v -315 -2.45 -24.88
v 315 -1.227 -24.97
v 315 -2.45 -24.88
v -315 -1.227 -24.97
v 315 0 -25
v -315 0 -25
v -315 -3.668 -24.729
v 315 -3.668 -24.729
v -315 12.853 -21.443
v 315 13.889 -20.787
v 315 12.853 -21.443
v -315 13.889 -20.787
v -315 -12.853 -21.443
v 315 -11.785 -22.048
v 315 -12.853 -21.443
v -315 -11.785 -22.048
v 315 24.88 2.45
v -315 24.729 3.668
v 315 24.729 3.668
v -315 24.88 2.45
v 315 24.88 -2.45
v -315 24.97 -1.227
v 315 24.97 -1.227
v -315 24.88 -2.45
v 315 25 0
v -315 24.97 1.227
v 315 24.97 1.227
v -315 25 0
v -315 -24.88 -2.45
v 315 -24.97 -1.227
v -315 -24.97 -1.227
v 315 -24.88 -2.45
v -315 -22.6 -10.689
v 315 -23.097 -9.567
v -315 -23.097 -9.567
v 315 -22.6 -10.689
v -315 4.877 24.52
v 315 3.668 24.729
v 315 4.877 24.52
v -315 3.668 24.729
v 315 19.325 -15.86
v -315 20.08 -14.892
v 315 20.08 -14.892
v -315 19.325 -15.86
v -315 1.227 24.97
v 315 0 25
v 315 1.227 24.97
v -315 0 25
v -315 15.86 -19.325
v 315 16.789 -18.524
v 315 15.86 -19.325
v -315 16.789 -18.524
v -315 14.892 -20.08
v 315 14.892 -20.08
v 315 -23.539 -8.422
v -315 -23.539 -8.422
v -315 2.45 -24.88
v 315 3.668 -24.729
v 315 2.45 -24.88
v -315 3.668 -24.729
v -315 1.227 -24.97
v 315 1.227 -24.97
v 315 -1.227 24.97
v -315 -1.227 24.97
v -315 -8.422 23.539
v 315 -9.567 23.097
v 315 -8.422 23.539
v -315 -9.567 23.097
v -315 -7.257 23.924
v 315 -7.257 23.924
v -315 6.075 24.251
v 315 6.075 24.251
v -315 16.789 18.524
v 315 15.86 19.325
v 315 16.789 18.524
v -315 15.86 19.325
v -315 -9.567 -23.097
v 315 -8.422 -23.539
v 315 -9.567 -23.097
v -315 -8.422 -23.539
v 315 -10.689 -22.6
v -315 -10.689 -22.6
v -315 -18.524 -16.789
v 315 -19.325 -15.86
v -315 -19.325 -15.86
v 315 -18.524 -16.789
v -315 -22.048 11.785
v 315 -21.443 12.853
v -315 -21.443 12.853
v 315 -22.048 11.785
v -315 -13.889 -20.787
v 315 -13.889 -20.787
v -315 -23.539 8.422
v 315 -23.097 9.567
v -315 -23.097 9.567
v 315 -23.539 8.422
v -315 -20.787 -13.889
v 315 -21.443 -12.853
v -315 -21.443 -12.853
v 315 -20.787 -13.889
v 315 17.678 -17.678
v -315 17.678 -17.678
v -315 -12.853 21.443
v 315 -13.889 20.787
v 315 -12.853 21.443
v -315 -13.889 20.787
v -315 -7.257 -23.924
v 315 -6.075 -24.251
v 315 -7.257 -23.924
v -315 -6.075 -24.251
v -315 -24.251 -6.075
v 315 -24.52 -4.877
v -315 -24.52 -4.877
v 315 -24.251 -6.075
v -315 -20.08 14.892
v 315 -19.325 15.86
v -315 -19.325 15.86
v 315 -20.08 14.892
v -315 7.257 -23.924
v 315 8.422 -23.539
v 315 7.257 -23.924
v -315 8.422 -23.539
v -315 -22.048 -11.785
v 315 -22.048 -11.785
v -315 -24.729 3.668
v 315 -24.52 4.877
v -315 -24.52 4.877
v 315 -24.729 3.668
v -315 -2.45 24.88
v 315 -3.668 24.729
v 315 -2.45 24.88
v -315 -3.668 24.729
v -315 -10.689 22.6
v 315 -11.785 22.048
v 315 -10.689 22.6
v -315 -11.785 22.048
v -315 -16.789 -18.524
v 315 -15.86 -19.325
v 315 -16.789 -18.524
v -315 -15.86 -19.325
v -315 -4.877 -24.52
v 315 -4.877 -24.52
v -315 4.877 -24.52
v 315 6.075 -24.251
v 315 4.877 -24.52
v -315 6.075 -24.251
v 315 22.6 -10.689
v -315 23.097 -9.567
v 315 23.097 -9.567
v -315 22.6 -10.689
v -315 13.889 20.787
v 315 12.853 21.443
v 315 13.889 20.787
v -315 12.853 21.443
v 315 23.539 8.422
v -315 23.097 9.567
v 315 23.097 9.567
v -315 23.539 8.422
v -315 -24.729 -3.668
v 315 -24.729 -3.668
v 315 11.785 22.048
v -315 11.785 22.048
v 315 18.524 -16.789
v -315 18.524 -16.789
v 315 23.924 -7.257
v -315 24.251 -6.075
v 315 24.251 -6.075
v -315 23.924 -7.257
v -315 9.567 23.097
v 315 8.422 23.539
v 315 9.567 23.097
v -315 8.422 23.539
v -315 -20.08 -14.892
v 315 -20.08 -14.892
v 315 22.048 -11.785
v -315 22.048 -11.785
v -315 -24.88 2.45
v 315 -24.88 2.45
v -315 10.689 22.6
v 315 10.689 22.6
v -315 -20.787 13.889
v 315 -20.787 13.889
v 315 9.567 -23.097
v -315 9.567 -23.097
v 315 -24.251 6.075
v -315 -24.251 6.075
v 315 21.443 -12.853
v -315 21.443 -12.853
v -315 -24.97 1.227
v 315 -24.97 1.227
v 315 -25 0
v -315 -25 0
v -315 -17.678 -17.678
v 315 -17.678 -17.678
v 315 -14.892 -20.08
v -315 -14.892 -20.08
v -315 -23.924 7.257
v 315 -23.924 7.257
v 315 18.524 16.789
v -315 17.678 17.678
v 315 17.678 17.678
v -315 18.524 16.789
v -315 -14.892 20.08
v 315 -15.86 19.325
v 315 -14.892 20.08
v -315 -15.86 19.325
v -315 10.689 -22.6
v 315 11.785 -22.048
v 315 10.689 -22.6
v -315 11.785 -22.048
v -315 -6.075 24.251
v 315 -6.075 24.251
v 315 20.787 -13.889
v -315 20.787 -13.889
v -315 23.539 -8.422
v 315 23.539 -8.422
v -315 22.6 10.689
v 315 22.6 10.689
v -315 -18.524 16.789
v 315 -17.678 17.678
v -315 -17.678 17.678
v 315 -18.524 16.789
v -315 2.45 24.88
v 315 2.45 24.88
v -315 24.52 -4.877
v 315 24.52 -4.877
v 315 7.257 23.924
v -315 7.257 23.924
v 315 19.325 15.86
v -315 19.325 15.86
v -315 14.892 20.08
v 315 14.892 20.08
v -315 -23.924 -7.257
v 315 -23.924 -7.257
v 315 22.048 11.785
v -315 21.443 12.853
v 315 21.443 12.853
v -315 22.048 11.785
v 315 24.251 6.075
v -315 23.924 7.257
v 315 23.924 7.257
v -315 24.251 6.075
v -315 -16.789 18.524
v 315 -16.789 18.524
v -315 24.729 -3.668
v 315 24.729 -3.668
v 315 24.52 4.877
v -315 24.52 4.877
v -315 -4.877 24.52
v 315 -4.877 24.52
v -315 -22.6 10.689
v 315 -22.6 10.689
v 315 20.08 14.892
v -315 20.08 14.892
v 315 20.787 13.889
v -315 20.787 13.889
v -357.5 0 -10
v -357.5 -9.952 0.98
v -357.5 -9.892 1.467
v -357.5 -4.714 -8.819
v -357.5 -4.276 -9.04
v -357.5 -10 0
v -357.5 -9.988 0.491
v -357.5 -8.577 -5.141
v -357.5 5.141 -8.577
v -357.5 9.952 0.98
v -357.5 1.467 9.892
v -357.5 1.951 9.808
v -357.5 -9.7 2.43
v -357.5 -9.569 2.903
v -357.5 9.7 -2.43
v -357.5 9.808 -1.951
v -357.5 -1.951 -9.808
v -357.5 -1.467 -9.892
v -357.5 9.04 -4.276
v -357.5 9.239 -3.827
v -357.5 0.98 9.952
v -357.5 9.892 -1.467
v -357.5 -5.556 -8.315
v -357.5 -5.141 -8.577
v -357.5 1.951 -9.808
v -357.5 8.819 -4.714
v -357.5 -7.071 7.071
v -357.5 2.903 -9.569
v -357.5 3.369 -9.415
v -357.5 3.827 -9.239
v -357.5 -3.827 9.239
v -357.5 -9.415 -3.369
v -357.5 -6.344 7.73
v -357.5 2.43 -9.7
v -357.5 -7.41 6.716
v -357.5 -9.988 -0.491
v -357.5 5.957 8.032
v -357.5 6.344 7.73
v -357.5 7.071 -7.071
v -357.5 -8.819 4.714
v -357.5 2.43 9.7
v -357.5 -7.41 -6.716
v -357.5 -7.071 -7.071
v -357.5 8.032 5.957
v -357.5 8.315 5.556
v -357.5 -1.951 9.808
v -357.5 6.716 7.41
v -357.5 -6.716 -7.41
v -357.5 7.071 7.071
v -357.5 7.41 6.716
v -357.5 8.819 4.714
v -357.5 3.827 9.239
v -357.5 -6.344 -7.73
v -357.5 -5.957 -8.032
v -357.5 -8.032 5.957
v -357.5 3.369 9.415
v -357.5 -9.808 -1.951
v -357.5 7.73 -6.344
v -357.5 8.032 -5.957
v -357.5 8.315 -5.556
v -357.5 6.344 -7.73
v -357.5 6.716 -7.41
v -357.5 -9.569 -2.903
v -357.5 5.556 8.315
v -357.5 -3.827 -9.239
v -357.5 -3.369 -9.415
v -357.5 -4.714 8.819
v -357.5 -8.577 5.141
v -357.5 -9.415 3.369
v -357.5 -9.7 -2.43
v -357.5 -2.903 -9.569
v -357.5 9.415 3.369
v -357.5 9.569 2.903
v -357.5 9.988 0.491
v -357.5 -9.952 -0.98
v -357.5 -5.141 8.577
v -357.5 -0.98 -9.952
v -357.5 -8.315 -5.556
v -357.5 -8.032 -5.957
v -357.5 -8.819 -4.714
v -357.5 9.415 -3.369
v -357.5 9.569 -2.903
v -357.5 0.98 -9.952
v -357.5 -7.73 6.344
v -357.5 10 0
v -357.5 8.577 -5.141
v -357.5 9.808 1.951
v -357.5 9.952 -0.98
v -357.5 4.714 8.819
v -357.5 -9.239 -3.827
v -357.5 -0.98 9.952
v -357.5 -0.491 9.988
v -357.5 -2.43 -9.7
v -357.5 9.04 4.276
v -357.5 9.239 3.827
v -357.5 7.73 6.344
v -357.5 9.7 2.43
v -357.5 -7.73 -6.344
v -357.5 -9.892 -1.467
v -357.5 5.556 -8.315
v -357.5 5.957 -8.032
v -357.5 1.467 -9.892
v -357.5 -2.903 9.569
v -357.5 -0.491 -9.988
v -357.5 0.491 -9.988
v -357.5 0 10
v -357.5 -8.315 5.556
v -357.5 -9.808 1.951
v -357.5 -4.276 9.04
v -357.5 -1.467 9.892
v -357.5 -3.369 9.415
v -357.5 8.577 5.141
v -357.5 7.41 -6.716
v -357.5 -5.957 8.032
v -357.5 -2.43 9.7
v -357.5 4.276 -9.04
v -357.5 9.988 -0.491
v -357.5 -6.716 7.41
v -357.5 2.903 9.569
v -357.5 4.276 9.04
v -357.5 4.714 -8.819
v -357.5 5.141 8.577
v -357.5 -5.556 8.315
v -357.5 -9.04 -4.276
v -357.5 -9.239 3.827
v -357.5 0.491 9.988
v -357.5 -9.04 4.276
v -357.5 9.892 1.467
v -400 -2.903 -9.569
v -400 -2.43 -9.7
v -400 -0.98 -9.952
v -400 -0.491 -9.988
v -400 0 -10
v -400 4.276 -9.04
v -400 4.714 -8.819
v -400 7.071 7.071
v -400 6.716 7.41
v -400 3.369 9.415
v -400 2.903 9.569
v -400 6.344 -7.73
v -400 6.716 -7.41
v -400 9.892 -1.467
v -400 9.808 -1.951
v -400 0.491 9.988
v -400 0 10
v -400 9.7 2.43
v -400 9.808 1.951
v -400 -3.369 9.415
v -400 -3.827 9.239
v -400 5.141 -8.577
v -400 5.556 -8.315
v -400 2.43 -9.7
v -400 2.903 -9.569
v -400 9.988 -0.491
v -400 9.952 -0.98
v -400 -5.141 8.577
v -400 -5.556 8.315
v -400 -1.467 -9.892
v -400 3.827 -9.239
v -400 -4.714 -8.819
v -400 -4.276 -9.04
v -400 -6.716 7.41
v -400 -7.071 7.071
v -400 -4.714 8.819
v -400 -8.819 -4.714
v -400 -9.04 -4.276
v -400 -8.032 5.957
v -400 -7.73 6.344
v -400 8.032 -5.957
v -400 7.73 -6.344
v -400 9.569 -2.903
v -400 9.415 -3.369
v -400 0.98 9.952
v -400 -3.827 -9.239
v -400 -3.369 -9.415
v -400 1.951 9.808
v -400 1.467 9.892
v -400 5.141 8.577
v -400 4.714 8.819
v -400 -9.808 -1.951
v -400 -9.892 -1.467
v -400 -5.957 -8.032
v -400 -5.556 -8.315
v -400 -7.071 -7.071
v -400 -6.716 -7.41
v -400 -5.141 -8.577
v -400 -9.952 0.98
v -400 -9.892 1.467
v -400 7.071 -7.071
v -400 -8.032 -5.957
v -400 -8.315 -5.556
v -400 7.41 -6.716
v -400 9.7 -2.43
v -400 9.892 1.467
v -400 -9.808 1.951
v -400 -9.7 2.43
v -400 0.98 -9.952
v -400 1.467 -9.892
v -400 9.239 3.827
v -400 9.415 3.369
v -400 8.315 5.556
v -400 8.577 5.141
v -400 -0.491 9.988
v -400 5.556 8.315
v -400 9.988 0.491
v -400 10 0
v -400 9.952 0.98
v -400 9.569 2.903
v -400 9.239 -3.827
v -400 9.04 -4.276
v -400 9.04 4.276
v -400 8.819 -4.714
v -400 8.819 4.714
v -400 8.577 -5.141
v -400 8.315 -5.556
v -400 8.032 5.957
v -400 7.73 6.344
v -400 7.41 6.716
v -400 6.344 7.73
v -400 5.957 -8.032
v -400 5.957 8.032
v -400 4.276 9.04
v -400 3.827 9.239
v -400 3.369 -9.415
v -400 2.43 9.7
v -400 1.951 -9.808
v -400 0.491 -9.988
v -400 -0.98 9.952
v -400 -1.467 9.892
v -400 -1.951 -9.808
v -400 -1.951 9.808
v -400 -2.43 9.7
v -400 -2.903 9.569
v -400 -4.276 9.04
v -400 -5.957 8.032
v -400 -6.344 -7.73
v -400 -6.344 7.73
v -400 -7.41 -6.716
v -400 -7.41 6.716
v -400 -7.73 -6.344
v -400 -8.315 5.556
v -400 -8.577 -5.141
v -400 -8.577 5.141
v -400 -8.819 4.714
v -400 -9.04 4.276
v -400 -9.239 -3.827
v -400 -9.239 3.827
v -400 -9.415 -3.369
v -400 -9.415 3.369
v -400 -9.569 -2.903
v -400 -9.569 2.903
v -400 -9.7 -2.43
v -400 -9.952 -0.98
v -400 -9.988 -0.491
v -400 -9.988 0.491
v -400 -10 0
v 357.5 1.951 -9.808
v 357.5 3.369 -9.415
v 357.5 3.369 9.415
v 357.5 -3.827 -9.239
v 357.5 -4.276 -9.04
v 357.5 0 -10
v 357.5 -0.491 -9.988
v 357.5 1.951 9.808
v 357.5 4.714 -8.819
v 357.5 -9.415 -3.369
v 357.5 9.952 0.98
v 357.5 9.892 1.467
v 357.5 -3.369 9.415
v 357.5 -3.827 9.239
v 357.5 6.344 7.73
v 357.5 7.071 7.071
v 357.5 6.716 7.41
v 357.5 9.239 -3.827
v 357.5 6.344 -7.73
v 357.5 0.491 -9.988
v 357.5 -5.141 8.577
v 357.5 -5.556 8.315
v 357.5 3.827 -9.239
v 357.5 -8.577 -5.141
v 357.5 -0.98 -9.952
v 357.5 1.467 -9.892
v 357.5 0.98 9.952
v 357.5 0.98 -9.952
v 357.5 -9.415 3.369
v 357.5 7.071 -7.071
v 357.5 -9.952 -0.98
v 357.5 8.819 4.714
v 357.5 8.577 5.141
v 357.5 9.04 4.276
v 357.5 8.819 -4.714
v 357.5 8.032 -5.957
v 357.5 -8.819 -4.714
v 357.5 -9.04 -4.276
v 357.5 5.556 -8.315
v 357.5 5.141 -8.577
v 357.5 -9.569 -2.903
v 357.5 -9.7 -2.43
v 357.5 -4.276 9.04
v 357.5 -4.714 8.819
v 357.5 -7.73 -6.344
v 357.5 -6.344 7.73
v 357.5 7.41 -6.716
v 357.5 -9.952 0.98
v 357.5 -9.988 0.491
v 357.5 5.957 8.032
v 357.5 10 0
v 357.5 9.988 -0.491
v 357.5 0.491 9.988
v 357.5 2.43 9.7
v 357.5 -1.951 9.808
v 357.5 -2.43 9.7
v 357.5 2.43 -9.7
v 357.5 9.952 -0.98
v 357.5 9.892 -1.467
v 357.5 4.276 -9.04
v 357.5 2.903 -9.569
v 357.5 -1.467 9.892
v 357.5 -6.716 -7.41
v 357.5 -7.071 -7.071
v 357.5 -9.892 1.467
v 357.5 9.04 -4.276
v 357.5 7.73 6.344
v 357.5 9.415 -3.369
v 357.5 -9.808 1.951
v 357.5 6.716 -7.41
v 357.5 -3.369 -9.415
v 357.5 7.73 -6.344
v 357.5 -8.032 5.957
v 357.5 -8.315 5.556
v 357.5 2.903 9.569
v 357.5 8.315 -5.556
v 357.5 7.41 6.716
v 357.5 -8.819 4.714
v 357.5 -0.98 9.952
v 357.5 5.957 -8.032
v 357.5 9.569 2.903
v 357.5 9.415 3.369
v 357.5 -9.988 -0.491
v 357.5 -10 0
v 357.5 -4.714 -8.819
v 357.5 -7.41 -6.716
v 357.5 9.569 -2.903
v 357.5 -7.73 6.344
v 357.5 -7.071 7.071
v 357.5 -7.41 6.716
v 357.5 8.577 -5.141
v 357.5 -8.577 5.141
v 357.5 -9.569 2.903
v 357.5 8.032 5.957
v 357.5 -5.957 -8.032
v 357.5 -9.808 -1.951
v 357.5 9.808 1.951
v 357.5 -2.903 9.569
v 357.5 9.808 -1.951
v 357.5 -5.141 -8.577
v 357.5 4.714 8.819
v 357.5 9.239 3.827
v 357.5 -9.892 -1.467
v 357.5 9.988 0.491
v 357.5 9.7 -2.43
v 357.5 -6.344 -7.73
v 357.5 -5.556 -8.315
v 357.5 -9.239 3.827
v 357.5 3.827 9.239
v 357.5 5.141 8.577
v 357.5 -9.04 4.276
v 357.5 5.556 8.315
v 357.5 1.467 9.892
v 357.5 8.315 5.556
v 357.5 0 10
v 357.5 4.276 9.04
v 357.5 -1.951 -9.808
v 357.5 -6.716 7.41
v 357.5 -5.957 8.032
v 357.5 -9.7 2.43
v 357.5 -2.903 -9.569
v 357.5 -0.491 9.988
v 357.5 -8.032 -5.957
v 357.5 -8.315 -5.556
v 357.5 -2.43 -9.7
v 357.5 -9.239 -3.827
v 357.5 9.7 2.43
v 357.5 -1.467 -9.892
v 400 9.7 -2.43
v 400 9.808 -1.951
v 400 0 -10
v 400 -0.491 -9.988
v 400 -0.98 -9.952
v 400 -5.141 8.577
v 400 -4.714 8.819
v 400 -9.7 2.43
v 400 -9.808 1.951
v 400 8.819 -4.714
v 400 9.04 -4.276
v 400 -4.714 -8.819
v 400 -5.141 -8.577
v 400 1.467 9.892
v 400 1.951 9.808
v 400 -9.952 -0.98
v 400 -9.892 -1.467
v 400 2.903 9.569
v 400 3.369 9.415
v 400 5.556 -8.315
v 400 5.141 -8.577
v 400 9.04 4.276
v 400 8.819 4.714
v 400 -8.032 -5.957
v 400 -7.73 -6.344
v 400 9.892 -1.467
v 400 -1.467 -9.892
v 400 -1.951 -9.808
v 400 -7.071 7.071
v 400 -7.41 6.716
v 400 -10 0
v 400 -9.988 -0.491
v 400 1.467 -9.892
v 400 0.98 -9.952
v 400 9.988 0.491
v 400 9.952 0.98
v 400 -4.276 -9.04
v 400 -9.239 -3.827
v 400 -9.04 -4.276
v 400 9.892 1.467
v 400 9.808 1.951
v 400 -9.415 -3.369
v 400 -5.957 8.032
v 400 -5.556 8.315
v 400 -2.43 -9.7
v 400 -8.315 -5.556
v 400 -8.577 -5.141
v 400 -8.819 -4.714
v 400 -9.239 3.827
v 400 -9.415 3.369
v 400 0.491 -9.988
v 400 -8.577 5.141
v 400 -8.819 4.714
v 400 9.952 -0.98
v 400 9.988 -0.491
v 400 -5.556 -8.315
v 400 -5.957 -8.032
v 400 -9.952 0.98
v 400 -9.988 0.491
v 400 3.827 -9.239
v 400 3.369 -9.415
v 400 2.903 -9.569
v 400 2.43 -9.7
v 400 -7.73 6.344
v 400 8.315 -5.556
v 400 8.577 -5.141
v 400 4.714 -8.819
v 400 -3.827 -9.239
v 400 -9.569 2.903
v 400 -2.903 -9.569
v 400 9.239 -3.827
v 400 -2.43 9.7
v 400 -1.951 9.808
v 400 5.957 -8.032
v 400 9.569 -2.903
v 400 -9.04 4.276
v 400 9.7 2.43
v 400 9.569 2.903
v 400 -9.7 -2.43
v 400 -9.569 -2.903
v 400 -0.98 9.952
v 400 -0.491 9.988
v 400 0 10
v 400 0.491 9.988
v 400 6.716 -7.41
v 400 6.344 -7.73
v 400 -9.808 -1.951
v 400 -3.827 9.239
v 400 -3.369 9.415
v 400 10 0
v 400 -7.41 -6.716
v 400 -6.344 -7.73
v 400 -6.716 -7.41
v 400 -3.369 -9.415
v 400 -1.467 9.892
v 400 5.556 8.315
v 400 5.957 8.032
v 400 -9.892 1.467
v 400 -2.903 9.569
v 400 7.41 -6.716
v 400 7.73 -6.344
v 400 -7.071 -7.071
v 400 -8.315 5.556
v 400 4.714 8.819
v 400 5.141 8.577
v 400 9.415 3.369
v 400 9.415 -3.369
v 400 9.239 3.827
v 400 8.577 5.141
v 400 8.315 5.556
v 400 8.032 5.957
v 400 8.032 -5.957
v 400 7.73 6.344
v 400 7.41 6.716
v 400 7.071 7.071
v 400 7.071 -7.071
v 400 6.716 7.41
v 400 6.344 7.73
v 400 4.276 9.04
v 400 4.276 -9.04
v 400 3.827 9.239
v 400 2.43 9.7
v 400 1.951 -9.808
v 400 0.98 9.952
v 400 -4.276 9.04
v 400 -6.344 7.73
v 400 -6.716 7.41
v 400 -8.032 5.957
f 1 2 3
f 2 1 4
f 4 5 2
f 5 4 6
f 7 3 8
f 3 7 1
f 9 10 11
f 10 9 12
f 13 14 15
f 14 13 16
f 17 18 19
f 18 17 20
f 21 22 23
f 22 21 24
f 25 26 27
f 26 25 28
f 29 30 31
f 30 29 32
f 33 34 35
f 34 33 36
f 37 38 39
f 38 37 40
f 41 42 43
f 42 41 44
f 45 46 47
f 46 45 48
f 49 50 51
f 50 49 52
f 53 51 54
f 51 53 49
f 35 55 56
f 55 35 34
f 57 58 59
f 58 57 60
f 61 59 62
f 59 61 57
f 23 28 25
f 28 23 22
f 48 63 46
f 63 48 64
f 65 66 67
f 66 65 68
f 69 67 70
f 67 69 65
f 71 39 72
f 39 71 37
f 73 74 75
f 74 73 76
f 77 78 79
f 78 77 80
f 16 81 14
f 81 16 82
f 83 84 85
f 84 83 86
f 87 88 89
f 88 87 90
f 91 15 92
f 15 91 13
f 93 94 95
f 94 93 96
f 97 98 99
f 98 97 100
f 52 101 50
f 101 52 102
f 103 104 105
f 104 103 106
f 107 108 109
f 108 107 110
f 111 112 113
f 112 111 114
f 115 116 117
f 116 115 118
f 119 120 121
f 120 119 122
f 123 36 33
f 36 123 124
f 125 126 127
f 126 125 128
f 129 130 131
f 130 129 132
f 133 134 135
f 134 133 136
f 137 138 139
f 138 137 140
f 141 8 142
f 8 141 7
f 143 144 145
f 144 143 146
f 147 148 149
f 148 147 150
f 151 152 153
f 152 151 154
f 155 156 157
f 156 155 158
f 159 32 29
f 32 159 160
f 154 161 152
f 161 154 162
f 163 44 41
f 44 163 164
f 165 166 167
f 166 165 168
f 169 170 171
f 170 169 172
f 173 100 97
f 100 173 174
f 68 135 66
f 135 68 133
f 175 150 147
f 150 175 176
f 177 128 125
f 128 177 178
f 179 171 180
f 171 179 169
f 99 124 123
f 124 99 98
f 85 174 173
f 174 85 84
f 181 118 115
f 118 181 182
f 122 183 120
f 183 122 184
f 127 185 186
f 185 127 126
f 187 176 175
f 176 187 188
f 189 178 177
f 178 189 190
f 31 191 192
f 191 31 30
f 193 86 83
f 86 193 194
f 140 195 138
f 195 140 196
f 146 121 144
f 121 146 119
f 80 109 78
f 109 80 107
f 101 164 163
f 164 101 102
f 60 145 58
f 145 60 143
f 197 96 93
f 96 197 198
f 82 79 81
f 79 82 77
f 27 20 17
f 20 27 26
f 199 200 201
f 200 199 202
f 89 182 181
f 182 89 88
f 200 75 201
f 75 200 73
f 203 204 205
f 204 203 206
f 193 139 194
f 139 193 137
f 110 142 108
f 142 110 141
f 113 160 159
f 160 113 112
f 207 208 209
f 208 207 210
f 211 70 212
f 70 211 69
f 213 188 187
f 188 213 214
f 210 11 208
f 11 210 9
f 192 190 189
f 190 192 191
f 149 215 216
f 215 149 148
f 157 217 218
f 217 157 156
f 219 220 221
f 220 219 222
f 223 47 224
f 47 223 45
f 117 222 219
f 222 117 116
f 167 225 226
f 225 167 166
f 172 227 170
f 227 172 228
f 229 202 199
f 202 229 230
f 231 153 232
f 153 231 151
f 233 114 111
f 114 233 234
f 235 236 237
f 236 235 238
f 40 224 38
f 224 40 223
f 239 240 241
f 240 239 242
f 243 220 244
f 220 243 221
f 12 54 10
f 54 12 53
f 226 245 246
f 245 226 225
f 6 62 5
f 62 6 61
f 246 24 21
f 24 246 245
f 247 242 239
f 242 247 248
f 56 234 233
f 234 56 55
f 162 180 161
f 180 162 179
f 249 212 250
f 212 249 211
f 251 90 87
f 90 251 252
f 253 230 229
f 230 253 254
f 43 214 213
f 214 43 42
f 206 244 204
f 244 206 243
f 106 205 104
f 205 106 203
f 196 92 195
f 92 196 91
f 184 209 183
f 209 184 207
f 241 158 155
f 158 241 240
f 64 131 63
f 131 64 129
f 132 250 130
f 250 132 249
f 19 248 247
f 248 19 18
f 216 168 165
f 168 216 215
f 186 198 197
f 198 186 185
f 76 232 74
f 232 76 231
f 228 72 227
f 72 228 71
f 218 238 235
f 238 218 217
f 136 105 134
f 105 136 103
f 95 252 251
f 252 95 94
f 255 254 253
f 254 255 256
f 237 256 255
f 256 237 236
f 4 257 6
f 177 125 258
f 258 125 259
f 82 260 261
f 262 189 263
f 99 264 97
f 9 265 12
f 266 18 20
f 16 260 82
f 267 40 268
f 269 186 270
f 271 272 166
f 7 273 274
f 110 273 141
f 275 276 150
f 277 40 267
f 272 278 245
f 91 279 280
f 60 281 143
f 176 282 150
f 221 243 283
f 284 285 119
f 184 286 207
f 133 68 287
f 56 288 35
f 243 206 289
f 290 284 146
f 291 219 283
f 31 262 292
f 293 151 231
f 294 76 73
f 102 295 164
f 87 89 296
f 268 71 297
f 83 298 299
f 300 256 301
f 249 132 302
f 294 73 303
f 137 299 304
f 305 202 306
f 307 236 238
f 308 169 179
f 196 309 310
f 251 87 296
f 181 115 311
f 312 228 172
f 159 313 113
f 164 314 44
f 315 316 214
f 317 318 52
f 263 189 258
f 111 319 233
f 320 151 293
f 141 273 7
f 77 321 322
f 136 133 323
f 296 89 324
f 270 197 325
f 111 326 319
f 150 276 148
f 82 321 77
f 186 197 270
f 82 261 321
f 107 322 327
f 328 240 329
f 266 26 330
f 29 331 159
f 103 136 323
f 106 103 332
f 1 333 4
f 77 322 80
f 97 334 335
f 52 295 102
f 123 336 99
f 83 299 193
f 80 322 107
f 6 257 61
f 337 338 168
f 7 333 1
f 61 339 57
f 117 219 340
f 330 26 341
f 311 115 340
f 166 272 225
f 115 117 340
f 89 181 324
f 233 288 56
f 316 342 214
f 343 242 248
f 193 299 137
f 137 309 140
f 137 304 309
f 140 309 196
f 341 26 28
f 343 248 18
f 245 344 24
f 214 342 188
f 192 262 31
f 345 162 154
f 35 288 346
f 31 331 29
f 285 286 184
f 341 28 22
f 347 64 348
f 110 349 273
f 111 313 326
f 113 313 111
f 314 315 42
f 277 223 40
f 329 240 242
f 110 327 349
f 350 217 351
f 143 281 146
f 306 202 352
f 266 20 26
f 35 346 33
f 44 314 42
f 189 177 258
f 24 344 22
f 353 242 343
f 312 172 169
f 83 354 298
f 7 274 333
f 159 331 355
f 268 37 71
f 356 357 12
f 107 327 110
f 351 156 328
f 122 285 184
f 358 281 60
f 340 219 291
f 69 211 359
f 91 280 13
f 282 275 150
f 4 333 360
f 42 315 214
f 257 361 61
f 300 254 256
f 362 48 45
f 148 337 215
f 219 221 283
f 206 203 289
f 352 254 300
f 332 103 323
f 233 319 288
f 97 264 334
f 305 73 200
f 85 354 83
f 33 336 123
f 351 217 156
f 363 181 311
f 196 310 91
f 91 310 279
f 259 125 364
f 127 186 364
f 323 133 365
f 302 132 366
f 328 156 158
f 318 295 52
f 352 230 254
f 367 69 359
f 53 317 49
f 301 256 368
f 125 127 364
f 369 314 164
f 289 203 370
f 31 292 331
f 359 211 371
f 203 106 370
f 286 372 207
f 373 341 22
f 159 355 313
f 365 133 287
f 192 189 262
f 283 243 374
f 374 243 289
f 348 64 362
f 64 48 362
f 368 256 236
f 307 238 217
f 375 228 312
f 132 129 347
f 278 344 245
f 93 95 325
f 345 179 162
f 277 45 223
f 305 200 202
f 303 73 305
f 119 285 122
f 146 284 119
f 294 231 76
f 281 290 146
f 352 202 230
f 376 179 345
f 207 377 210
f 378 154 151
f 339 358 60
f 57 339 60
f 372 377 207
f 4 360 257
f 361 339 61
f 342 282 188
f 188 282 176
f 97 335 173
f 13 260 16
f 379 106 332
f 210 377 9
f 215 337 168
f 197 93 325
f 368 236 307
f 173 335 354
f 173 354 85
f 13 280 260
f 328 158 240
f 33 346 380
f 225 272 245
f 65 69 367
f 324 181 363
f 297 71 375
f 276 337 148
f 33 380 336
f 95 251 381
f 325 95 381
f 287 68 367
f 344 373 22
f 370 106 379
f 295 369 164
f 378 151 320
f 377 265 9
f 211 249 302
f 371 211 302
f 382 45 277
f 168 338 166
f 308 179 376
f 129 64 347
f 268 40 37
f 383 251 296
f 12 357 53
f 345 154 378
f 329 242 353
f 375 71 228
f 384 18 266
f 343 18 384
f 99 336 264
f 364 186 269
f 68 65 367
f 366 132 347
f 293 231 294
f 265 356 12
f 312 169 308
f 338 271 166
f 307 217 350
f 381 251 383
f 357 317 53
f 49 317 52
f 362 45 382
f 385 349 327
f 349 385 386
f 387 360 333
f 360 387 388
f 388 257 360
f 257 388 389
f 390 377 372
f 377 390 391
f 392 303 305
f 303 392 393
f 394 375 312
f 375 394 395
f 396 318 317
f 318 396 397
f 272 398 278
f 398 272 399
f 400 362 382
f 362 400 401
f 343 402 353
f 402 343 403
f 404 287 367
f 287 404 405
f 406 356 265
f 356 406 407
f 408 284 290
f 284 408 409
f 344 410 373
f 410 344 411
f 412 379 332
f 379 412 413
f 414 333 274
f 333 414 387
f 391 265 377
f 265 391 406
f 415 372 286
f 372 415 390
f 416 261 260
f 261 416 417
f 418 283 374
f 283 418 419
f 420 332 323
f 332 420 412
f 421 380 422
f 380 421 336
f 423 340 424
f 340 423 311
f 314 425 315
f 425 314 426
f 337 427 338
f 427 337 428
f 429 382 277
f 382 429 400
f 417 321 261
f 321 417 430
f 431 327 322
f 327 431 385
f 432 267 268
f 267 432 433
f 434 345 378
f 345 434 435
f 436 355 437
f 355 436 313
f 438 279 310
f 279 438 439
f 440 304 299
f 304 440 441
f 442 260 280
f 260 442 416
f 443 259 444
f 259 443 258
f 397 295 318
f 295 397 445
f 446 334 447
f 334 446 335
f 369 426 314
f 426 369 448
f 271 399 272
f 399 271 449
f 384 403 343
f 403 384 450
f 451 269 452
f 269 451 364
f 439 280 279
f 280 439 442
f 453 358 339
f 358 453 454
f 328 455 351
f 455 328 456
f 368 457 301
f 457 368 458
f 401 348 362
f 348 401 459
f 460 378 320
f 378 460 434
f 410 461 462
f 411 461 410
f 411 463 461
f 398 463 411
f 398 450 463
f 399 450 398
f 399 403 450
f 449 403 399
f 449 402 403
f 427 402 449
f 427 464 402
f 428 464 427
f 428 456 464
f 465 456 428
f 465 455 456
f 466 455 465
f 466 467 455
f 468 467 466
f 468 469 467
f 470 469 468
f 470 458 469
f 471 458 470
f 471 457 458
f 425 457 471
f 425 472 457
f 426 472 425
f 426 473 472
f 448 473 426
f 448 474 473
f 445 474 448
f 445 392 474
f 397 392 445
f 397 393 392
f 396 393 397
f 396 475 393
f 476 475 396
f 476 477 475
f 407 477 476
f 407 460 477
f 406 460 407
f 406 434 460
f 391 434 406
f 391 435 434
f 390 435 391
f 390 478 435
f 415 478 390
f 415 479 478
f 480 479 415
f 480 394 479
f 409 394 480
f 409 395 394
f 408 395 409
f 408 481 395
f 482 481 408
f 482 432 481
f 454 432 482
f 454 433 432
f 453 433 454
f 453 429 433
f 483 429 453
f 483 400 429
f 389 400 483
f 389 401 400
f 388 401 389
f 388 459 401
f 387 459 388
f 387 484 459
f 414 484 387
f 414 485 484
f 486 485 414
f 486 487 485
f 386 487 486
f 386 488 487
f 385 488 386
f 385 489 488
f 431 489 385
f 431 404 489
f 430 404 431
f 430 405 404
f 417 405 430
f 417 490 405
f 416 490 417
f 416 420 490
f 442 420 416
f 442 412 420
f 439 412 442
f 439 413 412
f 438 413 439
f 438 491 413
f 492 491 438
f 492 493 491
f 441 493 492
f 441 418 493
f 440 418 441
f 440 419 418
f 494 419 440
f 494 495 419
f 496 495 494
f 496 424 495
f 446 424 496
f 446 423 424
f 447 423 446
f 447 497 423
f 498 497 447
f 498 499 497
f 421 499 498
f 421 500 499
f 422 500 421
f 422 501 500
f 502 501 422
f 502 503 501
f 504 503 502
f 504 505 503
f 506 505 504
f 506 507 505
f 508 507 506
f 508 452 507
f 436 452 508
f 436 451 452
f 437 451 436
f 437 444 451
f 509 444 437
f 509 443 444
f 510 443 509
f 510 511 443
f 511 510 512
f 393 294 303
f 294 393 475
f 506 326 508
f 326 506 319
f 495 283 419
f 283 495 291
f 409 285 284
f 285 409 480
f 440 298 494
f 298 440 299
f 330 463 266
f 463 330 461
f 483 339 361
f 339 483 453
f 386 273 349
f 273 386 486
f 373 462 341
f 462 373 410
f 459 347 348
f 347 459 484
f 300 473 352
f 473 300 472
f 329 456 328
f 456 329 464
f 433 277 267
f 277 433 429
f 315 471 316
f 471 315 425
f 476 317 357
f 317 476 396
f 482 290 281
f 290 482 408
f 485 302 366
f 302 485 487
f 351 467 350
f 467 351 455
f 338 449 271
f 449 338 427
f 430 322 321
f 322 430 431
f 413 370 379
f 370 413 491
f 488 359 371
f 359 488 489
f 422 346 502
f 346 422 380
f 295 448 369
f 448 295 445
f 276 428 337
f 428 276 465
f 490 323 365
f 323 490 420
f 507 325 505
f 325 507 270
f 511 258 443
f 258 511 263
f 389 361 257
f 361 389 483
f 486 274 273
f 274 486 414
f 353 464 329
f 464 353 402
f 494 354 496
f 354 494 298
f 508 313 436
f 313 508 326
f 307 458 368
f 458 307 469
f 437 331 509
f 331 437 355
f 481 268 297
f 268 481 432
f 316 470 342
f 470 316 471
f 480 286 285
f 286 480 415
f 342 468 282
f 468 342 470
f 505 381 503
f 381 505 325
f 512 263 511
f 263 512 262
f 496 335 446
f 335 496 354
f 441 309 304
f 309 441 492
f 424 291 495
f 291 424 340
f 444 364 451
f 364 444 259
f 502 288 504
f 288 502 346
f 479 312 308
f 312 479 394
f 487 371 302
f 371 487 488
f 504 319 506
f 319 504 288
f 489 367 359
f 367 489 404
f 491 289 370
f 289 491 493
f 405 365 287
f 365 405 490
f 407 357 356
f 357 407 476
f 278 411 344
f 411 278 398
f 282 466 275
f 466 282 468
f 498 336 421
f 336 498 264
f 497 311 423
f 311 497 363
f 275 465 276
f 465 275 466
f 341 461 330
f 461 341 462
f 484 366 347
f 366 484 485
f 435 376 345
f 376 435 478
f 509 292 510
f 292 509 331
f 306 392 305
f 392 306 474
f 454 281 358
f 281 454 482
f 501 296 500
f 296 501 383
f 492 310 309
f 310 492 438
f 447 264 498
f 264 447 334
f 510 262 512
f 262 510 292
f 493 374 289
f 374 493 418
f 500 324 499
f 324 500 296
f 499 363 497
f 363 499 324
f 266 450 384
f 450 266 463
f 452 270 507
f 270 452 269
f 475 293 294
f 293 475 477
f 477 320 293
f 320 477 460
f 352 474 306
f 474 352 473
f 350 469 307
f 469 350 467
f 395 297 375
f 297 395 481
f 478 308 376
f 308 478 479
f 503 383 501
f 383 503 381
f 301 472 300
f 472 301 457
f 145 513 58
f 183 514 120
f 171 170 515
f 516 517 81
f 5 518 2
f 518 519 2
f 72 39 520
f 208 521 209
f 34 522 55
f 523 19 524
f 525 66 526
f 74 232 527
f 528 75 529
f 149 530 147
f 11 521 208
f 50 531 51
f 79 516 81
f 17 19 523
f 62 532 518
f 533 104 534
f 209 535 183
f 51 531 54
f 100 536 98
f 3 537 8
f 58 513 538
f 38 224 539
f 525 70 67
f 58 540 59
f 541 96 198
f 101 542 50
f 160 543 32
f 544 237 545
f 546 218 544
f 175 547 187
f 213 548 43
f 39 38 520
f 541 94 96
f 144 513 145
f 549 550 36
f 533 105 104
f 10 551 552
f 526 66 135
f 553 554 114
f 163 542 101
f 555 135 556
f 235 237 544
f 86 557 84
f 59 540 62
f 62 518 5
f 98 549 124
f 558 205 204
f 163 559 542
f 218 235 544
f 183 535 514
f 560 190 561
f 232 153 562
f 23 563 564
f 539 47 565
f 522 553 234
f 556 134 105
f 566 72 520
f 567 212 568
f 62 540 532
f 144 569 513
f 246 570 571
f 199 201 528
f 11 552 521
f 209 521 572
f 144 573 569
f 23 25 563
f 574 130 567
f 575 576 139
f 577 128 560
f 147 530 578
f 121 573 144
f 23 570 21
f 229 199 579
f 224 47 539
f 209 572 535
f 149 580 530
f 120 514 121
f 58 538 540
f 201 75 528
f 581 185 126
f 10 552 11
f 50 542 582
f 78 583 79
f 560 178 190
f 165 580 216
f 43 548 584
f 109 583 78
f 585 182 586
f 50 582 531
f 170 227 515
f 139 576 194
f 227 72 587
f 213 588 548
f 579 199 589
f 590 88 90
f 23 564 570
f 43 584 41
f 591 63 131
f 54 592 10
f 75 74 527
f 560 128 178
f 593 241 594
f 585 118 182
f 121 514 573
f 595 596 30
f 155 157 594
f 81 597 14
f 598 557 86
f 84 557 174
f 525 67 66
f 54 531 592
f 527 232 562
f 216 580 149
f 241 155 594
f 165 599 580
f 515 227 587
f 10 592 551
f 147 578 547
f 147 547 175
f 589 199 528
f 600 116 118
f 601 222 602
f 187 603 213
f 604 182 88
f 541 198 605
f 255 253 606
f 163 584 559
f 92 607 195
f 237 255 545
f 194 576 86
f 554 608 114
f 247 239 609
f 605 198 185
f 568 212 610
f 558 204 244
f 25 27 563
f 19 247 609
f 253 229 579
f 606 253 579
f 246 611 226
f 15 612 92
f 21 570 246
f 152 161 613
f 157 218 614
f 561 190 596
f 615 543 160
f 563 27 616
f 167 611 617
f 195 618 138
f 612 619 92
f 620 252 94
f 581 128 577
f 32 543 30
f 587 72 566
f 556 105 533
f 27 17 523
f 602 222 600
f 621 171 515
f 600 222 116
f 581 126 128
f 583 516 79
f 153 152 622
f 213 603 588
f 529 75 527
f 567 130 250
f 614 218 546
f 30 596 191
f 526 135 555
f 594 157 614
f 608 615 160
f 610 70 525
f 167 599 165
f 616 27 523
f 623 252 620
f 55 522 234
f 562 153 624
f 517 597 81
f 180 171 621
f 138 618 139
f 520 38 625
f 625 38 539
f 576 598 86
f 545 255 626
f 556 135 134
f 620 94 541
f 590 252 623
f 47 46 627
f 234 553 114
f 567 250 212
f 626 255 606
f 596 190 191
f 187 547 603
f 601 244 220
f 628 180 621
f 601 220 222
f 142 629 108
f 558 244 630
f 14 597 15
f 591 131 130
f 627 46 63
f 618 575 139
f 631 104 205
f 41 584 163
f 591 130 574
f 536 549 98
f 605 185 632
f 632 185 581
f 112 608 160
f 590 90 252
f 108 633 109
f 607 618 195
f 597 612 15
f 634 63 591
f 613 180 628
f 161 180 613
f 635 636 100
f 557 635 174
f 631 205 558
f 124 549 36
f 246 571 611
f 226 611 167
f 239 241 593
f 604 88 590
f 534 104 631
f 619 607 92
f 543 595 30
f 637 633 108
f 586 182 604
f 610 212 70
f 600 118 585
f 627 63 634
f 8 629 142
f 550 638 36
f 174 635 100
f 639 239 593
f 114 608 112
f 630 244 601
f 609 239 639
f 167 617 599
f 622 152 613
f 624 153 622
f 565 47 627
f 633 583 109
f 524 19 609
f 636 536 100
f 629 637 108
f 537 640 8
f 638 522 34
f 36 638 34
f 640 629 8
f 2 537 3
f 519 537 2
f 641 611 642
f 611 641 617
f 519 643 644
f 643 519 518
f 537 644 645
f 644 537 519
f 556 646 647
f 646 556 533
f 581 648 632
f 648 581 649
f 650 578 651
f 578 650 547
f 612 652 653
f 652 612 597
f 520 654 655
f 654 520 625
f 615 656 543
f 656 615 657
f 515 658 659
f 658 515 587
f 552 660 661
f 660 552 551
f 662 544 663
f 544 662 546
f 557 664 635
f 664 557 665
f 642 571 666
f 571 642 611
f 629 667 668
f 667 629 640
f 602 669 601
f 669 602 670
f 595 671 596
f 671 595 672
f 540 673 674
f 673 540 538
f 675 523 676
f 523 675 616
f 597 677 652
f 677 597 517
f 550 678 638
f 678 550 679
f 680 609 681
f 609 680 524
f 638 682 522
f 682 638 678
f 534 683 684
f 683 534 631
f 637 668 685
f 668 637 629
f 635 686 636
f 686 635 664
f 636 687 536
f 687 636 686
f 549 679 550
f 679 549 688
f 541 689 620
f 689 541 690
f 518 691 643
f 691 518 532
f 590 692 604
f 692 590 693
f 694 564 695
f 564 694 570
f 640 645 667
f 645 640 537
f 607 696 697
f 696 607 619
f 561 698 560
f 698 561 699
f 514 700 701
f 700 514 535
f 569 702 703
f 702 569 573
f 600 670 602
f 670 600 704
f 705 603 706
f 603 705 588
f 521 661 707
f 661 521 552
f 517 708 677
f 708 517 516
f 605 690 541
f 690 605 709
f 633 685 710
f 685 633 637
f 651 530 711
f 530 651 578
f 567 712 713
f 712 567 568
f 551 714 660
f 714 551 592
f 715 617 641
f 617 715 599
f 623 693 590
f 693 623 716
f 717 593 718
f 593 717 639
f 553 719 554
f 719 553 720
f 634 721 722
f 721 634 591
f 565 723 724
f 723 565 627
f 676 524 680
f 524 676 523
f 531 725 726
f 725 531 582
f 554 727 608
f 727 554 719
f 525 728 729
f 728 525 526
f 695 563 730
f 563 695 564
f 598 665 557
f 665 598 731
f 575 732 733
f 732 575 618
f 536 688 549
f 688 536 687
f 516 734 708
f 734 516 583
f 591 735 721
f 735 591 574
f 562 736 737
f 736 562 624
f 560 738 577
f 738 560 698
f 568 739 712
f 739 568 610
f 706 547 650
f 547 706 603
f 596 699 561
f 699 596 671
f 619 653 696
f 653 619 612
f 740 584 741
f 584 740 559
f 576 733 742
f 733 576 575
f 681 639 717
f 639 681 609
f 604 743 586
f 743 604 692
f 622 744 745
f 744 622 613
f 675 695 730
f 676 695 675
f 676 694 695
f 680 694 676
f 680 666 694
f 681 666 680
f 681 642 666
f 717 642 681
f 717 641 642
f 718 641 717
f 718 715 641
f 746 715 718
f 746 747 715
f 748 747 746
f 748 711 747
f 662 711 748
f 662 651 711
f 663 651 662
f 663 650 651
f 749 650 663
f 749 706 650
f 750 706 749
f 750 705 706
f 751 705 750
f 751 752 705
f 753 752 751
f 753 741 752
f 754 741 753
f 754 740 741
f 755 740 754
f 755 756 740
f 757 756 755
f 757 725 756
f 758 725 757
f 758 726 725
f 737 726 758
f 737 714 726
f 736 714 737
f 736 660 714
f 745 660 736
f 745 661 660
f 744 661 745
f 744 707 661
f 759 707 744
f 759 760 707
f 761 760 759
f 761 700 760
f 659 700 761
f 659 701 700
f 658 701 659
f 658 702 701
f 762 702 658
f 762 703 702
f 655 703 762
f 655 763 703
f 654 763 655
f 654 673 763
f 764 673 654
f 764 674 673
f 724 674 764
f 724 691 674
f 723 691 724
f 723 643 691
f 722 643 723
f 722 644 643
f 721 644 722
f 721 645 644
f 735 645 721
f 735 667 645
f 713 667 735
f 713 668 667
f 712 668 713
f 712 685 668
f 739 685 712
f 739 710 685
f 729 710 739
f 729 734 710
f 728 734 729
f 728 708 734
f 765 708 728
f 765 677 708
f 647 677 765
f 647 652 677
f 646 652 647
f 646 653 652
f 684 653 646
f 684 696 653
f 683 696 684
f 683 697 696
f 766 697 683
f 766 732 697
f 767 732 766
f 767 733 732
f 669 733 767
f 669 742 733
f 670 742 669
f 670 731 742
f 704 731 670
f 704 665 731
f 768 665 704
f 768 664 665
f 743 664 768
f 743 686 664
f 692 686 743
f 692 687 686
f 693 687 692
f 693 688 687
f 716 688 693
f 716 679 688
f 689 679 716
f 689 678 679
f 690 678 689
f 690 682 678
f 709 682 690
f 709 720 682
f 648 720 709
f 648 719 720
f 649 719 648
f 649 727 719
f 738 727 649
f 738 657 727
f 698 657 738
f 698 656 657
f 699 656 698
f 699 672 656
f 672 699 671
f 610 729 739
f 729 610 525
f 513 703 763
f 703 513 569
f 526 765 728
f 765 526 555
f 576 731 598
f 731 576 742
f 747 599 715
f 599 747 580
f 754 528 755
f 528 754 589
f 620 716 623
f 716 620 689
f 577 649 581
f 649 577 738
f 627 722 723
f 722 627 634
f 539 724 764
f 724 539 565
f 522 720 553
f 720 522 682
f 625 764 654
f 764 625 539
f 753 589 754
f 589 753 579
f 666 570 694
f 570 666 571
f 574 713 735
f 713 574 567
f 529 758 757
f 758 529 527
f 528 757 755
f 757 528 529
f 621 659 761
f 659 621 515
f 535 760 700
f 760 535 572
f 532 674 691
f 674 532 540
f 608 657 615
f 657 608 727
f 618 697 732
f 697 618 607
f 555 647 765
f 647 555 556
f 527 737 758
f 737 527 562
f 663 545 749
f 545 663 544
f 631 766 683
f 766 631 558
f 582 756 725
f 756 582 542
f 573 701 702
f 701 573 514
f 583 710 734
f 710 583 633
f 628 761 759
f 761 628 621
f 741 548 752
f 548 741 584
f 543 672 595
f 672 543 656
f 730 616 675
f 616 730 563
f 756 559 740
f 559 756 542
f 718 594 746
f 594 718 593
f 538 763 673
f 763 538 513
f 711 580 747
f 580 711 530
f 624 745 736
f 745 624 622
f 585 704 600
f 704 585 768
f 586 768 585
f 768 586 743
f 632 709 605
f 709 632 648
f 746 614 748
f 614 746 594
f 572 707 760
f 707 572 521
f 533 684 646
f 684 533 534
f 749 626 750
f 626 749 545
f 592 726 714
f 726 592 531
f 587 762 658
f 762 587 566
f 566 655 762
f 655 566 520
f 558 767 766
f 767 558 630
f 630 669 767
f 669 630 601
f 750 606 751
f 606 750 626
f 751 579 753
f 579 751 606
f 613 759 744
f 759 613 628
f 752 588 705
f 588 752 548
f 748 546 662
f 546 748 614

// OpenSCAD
laser_tube(800);

module laser_tube(tube_length, laser=false)
{
  translate([tube_length/2,0,0])
  rotate([0,90,180])
  union(){
    //50,50,95,80
    end_length=85;
    union(){
        color("GhostWhite", alpha=.2)translate([0,0,end_length])cylinder(d=50,h=tube_length-(end_length*2),$fn=128);
        color("GhostWhite", alpha=.2)translate([0,0,tube_length-end_length])cylinder(d1=50,d2=20,h=end_length/2,$fn=128);
        color("PaleGoldenrod")translate([0,0,tube_length-(end_length/2)])cylinder(d=20,h=end_length/2,$fn=128);
        color("GhostWhite", alpha=.2)translate([0,0,end_length/2])cylinder(d1=20,d2=50,h=end_length/2,$fn=128);
        color("PaleGoldenrod")translate([0,0,0])cylinder(d=20,h=end_length/2,$fn=128);
    }
    
    //Laser beam (for alignment)
    if(laser==true){
      translate([0,0,800])color("red",.7)cylinder(d=1, h=120, $fn=32);
    }
  }//union
}
